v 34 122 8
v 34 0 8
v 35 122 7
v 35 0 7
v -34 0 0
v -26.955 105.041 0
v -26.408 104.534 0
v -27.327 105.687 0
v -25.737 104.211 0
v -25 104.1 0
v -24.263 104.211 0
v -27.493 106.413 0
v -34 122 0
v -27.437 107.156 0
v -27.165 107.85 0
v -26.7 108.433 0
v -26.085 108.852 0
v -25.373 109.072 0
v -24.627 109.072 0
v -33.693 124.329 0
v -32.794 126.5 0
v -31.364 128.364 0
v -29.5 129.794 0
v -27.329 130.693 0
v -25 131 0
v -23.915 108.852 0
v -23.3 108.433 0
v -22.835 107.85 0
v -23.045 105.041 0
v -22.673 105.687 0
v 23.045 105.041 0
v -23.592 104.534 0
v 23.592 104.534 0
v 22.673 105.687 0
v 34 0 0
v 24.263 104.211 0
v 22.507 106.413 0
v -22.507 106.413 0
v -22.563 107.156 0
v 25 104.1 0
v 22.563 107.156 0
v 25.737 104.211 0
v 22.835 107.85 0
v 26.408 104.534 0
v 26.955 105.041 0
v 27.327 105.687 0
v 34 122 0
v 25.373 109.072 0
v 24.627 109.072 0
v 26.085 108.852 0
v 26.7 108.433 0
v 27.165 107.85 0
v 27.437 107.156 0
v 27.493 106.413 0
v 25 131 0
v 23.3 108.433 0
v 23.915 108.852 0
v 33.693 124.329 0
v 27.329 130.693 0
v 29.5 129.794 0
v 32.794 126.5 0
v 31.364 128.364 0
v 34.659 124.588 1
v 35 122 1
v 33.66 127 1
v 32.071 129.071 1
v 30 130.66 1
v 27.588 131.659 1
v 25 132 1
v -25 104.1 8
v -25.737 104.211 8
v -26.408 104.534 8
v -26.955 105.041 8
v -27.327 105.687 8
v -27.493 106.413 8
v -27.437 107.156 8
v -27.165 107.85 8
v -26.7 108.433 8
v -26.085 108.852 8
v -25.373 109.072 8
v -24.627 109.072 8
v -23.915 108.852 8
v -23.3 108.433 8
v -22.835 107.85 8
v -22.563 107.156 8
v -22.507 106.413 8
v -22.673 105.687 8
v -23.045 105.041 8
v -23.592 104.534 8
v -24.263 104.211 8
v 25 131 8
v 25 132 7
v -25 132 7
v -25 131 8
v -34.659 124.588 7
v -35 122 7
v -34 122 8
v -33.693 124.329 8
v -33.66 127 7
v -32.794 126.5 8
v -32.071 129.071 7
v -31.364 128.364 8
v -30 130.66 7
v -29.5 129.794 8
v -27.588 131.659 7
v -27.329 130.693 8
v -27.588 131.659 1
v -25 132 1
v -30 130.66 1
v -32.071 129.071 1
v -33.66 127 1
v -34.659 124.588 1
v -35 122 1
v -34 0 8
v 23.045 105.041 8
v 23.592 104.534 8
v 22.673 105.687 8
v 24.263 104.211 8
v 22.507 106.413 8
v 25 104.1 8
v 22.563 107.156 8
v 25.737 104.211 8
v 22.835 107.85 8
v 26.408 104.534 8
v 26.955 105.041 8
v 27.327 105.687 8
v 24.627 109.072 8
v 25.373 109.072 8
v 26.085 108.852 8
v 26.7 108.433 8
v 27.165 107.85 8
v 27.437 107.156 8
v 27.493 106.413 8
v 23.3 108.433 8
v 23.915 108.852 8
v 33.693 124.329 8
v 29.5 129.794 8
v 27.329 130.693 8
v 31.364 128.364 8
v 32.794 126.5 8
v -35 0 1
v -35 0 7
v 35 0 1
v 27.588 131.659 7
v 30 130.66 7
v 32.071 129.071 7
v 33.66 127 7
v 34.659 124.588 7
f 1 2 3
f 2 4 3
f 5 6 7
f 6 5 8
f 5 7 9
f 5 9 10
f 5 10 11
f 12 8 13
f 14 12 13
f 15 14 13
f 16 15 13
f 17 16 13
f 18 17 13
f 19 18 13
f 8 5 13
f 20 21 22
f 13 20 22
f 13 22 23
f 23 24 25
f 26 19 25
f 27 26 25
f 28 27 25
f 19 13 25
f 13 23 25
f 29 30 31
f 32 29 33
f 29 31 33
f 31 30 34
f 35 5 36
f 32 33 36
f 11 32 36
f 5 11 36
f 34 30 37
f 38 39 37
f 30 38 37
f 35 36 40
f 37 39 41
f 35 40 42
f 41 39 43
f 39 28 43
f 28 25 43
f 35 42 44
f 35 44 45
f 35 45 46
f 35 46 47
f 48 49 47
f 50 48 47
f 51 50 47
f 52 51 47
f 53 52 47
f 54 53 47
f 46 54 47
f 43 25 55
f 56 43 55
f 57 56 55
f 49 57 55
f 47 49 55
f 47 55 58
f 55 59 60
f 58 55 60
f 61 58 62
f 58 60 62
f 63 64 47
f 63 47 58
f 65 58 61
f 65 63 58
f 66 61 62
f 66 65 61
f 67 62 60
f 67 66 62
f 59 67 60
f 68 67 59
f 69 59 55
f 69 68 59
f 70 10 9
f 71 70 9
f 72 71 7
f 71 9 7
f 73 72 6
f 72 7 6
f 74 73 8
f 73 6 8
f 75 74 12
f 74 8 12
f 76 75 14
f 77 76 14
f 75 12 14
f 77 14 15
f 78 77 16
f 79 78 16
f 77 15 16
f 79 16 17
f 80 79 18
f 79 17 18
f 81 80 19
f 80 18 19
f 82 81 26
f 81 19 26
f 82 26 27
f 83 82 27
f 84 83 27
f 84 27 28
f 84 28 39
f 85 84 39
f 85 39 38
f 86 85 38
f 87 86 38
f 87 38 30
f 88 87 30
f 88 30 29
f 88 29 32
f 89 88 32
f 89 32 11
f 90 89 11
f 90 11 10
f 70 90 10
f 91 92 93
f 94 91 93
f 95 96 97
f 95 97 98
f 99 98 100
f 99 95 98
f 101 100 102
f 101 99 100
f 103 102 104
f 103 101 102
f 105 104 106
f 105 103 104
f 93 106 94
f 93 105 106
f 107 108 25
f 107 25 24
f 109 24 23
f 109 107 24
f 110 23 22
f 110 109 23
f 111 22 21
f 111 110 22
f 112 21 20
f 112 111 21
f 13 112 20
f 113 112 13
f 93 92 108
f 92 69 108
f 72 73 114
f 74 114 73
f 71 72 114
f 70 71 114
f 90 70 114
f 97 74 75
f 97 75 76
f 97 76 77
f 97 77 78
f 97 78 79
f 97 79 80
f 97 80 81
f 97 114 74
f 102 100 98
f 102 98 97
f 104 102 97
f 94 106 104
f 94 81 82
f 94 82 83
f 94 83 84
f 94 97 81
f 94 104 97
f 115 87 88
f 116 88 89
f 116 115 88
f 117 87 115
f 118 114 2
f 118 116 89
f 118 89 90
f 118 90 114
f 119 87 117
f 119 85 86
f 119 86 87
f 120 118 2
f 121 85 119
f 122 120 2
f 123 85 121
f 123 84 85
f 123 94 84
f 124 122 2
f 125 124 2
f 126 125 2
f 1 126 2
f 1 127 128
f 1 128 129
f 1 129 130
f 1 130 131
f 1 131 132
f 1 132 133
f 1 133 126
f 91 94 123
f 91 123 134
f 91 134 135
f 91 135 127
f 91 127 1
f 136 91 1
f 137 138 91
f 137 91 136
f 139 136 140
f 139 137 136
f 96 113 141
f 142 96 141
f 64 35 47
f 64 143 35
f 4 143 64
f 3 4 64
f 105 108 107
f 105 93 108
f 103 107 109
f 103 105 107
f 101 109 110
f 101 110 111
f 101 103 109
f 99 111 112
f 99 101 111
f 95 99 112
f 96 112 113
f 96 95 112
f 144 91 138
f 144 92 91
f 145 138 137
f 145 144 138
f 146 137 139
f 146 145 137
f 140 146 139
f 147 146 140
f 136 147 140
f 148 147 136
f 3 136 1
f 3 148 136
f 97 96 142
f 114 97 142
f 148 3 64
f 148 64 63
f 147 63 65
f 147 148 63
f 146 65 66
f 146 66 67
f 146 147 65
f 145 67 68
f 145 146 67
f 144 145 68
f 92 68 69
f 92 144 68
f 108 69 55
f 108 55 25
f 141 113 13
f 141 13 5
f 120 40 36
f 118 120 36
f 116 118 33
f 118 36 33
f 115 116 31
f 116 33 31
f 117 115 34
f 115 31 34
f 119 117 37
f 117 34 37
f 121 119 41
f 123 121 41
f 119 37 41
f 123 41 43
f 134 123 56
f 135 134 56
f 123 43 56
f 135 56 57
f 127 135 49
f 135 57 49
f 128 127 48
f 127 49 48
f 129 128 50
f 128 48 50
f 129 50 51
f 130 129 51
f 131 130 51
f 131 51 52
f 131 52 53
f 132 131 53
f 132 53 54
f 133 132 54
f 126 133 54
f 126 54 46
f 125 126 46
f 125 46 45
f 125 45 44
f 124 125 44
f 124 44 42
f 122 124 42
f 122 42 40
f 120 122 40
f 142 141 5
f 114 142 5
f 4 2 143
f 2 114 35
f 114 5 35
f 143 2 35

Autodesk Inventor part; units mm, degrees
ref_plane "YZ Plane" through (0, 0, 0) normal (1, 0, 0) x (0, 1, 0)
ref_plane "XZ Plane" through (0, 0, 0) normal (0, 1, 0) x (-1, 0, 0)
ref_plane "XY Plane" through (0, 0, 0) normal (0, 0, 1) x (1, 0, 0)
sketch "Sketch1" plane through (0, 0, 0) normal (0, 0, 1) x (1, 0, 0)
  line L0 (-35, 0) -> (35, 0)
  line L1 (35, 0) -> (35, 132)
  line L2 (35, 132) -> (-35, 132)
  line L3 (-35, 132) -> (-35, 0)
  point P0 (0, 0)
  dimension "d0" = 70
  dimension "d1" = 35
  dimension "d2" = 132
extrude "Extrusion1" add sketch "Sketch1" along normal blind 8
fillet "Fillet1" radius 10 2 edges at (-35, 132, 4) (35, 132, 4)
sketch "Sketch2" plane through (0, 0, 8) normal (0, 0, 1) x (1, 0, 0)
  line L0 (35, 0) -> (35, 122) projected
  line L1 (-35, 122) -> (-35, 0) projected
  line L2 (25, 132) -> (-25, 132) projected
  line L3 (-35, 0) -> (35, 0) projected
  point P0 (0, 0)
  point P1 (-25, 106.6)
  point P2 (25, 106.6)
  dimension "d6" = 70
  dimension "d9" = 50
  dimension "d10" = 0
  dimension "d11" = 10
  dimension "d13" = 106.6
hole "Hole1" at (-25, 106.6, 8) at (25, 106.6, 8) direction (0, 0, -1) diameter 5 depth 8
chamfer "Chamfer1" distance 1 angle 45 10 edges at (0, 132, 8) (-32.0711, 129.0711, 8) (-35, 61, 8) (32.0711, 129.0711, 8) (35, 61, 8) (0, 132, 0) (-32.0711, 129.0711, 0) (-35, 61, 0) (32.0711, 129.0711, 0) (35, 61, 0)
equation "\"d1\" = 0.5 * d0"
equation "\"d11\" = -0.5 * d9 + 0.5 * d6"
properties part number "motorHolder_stator"
